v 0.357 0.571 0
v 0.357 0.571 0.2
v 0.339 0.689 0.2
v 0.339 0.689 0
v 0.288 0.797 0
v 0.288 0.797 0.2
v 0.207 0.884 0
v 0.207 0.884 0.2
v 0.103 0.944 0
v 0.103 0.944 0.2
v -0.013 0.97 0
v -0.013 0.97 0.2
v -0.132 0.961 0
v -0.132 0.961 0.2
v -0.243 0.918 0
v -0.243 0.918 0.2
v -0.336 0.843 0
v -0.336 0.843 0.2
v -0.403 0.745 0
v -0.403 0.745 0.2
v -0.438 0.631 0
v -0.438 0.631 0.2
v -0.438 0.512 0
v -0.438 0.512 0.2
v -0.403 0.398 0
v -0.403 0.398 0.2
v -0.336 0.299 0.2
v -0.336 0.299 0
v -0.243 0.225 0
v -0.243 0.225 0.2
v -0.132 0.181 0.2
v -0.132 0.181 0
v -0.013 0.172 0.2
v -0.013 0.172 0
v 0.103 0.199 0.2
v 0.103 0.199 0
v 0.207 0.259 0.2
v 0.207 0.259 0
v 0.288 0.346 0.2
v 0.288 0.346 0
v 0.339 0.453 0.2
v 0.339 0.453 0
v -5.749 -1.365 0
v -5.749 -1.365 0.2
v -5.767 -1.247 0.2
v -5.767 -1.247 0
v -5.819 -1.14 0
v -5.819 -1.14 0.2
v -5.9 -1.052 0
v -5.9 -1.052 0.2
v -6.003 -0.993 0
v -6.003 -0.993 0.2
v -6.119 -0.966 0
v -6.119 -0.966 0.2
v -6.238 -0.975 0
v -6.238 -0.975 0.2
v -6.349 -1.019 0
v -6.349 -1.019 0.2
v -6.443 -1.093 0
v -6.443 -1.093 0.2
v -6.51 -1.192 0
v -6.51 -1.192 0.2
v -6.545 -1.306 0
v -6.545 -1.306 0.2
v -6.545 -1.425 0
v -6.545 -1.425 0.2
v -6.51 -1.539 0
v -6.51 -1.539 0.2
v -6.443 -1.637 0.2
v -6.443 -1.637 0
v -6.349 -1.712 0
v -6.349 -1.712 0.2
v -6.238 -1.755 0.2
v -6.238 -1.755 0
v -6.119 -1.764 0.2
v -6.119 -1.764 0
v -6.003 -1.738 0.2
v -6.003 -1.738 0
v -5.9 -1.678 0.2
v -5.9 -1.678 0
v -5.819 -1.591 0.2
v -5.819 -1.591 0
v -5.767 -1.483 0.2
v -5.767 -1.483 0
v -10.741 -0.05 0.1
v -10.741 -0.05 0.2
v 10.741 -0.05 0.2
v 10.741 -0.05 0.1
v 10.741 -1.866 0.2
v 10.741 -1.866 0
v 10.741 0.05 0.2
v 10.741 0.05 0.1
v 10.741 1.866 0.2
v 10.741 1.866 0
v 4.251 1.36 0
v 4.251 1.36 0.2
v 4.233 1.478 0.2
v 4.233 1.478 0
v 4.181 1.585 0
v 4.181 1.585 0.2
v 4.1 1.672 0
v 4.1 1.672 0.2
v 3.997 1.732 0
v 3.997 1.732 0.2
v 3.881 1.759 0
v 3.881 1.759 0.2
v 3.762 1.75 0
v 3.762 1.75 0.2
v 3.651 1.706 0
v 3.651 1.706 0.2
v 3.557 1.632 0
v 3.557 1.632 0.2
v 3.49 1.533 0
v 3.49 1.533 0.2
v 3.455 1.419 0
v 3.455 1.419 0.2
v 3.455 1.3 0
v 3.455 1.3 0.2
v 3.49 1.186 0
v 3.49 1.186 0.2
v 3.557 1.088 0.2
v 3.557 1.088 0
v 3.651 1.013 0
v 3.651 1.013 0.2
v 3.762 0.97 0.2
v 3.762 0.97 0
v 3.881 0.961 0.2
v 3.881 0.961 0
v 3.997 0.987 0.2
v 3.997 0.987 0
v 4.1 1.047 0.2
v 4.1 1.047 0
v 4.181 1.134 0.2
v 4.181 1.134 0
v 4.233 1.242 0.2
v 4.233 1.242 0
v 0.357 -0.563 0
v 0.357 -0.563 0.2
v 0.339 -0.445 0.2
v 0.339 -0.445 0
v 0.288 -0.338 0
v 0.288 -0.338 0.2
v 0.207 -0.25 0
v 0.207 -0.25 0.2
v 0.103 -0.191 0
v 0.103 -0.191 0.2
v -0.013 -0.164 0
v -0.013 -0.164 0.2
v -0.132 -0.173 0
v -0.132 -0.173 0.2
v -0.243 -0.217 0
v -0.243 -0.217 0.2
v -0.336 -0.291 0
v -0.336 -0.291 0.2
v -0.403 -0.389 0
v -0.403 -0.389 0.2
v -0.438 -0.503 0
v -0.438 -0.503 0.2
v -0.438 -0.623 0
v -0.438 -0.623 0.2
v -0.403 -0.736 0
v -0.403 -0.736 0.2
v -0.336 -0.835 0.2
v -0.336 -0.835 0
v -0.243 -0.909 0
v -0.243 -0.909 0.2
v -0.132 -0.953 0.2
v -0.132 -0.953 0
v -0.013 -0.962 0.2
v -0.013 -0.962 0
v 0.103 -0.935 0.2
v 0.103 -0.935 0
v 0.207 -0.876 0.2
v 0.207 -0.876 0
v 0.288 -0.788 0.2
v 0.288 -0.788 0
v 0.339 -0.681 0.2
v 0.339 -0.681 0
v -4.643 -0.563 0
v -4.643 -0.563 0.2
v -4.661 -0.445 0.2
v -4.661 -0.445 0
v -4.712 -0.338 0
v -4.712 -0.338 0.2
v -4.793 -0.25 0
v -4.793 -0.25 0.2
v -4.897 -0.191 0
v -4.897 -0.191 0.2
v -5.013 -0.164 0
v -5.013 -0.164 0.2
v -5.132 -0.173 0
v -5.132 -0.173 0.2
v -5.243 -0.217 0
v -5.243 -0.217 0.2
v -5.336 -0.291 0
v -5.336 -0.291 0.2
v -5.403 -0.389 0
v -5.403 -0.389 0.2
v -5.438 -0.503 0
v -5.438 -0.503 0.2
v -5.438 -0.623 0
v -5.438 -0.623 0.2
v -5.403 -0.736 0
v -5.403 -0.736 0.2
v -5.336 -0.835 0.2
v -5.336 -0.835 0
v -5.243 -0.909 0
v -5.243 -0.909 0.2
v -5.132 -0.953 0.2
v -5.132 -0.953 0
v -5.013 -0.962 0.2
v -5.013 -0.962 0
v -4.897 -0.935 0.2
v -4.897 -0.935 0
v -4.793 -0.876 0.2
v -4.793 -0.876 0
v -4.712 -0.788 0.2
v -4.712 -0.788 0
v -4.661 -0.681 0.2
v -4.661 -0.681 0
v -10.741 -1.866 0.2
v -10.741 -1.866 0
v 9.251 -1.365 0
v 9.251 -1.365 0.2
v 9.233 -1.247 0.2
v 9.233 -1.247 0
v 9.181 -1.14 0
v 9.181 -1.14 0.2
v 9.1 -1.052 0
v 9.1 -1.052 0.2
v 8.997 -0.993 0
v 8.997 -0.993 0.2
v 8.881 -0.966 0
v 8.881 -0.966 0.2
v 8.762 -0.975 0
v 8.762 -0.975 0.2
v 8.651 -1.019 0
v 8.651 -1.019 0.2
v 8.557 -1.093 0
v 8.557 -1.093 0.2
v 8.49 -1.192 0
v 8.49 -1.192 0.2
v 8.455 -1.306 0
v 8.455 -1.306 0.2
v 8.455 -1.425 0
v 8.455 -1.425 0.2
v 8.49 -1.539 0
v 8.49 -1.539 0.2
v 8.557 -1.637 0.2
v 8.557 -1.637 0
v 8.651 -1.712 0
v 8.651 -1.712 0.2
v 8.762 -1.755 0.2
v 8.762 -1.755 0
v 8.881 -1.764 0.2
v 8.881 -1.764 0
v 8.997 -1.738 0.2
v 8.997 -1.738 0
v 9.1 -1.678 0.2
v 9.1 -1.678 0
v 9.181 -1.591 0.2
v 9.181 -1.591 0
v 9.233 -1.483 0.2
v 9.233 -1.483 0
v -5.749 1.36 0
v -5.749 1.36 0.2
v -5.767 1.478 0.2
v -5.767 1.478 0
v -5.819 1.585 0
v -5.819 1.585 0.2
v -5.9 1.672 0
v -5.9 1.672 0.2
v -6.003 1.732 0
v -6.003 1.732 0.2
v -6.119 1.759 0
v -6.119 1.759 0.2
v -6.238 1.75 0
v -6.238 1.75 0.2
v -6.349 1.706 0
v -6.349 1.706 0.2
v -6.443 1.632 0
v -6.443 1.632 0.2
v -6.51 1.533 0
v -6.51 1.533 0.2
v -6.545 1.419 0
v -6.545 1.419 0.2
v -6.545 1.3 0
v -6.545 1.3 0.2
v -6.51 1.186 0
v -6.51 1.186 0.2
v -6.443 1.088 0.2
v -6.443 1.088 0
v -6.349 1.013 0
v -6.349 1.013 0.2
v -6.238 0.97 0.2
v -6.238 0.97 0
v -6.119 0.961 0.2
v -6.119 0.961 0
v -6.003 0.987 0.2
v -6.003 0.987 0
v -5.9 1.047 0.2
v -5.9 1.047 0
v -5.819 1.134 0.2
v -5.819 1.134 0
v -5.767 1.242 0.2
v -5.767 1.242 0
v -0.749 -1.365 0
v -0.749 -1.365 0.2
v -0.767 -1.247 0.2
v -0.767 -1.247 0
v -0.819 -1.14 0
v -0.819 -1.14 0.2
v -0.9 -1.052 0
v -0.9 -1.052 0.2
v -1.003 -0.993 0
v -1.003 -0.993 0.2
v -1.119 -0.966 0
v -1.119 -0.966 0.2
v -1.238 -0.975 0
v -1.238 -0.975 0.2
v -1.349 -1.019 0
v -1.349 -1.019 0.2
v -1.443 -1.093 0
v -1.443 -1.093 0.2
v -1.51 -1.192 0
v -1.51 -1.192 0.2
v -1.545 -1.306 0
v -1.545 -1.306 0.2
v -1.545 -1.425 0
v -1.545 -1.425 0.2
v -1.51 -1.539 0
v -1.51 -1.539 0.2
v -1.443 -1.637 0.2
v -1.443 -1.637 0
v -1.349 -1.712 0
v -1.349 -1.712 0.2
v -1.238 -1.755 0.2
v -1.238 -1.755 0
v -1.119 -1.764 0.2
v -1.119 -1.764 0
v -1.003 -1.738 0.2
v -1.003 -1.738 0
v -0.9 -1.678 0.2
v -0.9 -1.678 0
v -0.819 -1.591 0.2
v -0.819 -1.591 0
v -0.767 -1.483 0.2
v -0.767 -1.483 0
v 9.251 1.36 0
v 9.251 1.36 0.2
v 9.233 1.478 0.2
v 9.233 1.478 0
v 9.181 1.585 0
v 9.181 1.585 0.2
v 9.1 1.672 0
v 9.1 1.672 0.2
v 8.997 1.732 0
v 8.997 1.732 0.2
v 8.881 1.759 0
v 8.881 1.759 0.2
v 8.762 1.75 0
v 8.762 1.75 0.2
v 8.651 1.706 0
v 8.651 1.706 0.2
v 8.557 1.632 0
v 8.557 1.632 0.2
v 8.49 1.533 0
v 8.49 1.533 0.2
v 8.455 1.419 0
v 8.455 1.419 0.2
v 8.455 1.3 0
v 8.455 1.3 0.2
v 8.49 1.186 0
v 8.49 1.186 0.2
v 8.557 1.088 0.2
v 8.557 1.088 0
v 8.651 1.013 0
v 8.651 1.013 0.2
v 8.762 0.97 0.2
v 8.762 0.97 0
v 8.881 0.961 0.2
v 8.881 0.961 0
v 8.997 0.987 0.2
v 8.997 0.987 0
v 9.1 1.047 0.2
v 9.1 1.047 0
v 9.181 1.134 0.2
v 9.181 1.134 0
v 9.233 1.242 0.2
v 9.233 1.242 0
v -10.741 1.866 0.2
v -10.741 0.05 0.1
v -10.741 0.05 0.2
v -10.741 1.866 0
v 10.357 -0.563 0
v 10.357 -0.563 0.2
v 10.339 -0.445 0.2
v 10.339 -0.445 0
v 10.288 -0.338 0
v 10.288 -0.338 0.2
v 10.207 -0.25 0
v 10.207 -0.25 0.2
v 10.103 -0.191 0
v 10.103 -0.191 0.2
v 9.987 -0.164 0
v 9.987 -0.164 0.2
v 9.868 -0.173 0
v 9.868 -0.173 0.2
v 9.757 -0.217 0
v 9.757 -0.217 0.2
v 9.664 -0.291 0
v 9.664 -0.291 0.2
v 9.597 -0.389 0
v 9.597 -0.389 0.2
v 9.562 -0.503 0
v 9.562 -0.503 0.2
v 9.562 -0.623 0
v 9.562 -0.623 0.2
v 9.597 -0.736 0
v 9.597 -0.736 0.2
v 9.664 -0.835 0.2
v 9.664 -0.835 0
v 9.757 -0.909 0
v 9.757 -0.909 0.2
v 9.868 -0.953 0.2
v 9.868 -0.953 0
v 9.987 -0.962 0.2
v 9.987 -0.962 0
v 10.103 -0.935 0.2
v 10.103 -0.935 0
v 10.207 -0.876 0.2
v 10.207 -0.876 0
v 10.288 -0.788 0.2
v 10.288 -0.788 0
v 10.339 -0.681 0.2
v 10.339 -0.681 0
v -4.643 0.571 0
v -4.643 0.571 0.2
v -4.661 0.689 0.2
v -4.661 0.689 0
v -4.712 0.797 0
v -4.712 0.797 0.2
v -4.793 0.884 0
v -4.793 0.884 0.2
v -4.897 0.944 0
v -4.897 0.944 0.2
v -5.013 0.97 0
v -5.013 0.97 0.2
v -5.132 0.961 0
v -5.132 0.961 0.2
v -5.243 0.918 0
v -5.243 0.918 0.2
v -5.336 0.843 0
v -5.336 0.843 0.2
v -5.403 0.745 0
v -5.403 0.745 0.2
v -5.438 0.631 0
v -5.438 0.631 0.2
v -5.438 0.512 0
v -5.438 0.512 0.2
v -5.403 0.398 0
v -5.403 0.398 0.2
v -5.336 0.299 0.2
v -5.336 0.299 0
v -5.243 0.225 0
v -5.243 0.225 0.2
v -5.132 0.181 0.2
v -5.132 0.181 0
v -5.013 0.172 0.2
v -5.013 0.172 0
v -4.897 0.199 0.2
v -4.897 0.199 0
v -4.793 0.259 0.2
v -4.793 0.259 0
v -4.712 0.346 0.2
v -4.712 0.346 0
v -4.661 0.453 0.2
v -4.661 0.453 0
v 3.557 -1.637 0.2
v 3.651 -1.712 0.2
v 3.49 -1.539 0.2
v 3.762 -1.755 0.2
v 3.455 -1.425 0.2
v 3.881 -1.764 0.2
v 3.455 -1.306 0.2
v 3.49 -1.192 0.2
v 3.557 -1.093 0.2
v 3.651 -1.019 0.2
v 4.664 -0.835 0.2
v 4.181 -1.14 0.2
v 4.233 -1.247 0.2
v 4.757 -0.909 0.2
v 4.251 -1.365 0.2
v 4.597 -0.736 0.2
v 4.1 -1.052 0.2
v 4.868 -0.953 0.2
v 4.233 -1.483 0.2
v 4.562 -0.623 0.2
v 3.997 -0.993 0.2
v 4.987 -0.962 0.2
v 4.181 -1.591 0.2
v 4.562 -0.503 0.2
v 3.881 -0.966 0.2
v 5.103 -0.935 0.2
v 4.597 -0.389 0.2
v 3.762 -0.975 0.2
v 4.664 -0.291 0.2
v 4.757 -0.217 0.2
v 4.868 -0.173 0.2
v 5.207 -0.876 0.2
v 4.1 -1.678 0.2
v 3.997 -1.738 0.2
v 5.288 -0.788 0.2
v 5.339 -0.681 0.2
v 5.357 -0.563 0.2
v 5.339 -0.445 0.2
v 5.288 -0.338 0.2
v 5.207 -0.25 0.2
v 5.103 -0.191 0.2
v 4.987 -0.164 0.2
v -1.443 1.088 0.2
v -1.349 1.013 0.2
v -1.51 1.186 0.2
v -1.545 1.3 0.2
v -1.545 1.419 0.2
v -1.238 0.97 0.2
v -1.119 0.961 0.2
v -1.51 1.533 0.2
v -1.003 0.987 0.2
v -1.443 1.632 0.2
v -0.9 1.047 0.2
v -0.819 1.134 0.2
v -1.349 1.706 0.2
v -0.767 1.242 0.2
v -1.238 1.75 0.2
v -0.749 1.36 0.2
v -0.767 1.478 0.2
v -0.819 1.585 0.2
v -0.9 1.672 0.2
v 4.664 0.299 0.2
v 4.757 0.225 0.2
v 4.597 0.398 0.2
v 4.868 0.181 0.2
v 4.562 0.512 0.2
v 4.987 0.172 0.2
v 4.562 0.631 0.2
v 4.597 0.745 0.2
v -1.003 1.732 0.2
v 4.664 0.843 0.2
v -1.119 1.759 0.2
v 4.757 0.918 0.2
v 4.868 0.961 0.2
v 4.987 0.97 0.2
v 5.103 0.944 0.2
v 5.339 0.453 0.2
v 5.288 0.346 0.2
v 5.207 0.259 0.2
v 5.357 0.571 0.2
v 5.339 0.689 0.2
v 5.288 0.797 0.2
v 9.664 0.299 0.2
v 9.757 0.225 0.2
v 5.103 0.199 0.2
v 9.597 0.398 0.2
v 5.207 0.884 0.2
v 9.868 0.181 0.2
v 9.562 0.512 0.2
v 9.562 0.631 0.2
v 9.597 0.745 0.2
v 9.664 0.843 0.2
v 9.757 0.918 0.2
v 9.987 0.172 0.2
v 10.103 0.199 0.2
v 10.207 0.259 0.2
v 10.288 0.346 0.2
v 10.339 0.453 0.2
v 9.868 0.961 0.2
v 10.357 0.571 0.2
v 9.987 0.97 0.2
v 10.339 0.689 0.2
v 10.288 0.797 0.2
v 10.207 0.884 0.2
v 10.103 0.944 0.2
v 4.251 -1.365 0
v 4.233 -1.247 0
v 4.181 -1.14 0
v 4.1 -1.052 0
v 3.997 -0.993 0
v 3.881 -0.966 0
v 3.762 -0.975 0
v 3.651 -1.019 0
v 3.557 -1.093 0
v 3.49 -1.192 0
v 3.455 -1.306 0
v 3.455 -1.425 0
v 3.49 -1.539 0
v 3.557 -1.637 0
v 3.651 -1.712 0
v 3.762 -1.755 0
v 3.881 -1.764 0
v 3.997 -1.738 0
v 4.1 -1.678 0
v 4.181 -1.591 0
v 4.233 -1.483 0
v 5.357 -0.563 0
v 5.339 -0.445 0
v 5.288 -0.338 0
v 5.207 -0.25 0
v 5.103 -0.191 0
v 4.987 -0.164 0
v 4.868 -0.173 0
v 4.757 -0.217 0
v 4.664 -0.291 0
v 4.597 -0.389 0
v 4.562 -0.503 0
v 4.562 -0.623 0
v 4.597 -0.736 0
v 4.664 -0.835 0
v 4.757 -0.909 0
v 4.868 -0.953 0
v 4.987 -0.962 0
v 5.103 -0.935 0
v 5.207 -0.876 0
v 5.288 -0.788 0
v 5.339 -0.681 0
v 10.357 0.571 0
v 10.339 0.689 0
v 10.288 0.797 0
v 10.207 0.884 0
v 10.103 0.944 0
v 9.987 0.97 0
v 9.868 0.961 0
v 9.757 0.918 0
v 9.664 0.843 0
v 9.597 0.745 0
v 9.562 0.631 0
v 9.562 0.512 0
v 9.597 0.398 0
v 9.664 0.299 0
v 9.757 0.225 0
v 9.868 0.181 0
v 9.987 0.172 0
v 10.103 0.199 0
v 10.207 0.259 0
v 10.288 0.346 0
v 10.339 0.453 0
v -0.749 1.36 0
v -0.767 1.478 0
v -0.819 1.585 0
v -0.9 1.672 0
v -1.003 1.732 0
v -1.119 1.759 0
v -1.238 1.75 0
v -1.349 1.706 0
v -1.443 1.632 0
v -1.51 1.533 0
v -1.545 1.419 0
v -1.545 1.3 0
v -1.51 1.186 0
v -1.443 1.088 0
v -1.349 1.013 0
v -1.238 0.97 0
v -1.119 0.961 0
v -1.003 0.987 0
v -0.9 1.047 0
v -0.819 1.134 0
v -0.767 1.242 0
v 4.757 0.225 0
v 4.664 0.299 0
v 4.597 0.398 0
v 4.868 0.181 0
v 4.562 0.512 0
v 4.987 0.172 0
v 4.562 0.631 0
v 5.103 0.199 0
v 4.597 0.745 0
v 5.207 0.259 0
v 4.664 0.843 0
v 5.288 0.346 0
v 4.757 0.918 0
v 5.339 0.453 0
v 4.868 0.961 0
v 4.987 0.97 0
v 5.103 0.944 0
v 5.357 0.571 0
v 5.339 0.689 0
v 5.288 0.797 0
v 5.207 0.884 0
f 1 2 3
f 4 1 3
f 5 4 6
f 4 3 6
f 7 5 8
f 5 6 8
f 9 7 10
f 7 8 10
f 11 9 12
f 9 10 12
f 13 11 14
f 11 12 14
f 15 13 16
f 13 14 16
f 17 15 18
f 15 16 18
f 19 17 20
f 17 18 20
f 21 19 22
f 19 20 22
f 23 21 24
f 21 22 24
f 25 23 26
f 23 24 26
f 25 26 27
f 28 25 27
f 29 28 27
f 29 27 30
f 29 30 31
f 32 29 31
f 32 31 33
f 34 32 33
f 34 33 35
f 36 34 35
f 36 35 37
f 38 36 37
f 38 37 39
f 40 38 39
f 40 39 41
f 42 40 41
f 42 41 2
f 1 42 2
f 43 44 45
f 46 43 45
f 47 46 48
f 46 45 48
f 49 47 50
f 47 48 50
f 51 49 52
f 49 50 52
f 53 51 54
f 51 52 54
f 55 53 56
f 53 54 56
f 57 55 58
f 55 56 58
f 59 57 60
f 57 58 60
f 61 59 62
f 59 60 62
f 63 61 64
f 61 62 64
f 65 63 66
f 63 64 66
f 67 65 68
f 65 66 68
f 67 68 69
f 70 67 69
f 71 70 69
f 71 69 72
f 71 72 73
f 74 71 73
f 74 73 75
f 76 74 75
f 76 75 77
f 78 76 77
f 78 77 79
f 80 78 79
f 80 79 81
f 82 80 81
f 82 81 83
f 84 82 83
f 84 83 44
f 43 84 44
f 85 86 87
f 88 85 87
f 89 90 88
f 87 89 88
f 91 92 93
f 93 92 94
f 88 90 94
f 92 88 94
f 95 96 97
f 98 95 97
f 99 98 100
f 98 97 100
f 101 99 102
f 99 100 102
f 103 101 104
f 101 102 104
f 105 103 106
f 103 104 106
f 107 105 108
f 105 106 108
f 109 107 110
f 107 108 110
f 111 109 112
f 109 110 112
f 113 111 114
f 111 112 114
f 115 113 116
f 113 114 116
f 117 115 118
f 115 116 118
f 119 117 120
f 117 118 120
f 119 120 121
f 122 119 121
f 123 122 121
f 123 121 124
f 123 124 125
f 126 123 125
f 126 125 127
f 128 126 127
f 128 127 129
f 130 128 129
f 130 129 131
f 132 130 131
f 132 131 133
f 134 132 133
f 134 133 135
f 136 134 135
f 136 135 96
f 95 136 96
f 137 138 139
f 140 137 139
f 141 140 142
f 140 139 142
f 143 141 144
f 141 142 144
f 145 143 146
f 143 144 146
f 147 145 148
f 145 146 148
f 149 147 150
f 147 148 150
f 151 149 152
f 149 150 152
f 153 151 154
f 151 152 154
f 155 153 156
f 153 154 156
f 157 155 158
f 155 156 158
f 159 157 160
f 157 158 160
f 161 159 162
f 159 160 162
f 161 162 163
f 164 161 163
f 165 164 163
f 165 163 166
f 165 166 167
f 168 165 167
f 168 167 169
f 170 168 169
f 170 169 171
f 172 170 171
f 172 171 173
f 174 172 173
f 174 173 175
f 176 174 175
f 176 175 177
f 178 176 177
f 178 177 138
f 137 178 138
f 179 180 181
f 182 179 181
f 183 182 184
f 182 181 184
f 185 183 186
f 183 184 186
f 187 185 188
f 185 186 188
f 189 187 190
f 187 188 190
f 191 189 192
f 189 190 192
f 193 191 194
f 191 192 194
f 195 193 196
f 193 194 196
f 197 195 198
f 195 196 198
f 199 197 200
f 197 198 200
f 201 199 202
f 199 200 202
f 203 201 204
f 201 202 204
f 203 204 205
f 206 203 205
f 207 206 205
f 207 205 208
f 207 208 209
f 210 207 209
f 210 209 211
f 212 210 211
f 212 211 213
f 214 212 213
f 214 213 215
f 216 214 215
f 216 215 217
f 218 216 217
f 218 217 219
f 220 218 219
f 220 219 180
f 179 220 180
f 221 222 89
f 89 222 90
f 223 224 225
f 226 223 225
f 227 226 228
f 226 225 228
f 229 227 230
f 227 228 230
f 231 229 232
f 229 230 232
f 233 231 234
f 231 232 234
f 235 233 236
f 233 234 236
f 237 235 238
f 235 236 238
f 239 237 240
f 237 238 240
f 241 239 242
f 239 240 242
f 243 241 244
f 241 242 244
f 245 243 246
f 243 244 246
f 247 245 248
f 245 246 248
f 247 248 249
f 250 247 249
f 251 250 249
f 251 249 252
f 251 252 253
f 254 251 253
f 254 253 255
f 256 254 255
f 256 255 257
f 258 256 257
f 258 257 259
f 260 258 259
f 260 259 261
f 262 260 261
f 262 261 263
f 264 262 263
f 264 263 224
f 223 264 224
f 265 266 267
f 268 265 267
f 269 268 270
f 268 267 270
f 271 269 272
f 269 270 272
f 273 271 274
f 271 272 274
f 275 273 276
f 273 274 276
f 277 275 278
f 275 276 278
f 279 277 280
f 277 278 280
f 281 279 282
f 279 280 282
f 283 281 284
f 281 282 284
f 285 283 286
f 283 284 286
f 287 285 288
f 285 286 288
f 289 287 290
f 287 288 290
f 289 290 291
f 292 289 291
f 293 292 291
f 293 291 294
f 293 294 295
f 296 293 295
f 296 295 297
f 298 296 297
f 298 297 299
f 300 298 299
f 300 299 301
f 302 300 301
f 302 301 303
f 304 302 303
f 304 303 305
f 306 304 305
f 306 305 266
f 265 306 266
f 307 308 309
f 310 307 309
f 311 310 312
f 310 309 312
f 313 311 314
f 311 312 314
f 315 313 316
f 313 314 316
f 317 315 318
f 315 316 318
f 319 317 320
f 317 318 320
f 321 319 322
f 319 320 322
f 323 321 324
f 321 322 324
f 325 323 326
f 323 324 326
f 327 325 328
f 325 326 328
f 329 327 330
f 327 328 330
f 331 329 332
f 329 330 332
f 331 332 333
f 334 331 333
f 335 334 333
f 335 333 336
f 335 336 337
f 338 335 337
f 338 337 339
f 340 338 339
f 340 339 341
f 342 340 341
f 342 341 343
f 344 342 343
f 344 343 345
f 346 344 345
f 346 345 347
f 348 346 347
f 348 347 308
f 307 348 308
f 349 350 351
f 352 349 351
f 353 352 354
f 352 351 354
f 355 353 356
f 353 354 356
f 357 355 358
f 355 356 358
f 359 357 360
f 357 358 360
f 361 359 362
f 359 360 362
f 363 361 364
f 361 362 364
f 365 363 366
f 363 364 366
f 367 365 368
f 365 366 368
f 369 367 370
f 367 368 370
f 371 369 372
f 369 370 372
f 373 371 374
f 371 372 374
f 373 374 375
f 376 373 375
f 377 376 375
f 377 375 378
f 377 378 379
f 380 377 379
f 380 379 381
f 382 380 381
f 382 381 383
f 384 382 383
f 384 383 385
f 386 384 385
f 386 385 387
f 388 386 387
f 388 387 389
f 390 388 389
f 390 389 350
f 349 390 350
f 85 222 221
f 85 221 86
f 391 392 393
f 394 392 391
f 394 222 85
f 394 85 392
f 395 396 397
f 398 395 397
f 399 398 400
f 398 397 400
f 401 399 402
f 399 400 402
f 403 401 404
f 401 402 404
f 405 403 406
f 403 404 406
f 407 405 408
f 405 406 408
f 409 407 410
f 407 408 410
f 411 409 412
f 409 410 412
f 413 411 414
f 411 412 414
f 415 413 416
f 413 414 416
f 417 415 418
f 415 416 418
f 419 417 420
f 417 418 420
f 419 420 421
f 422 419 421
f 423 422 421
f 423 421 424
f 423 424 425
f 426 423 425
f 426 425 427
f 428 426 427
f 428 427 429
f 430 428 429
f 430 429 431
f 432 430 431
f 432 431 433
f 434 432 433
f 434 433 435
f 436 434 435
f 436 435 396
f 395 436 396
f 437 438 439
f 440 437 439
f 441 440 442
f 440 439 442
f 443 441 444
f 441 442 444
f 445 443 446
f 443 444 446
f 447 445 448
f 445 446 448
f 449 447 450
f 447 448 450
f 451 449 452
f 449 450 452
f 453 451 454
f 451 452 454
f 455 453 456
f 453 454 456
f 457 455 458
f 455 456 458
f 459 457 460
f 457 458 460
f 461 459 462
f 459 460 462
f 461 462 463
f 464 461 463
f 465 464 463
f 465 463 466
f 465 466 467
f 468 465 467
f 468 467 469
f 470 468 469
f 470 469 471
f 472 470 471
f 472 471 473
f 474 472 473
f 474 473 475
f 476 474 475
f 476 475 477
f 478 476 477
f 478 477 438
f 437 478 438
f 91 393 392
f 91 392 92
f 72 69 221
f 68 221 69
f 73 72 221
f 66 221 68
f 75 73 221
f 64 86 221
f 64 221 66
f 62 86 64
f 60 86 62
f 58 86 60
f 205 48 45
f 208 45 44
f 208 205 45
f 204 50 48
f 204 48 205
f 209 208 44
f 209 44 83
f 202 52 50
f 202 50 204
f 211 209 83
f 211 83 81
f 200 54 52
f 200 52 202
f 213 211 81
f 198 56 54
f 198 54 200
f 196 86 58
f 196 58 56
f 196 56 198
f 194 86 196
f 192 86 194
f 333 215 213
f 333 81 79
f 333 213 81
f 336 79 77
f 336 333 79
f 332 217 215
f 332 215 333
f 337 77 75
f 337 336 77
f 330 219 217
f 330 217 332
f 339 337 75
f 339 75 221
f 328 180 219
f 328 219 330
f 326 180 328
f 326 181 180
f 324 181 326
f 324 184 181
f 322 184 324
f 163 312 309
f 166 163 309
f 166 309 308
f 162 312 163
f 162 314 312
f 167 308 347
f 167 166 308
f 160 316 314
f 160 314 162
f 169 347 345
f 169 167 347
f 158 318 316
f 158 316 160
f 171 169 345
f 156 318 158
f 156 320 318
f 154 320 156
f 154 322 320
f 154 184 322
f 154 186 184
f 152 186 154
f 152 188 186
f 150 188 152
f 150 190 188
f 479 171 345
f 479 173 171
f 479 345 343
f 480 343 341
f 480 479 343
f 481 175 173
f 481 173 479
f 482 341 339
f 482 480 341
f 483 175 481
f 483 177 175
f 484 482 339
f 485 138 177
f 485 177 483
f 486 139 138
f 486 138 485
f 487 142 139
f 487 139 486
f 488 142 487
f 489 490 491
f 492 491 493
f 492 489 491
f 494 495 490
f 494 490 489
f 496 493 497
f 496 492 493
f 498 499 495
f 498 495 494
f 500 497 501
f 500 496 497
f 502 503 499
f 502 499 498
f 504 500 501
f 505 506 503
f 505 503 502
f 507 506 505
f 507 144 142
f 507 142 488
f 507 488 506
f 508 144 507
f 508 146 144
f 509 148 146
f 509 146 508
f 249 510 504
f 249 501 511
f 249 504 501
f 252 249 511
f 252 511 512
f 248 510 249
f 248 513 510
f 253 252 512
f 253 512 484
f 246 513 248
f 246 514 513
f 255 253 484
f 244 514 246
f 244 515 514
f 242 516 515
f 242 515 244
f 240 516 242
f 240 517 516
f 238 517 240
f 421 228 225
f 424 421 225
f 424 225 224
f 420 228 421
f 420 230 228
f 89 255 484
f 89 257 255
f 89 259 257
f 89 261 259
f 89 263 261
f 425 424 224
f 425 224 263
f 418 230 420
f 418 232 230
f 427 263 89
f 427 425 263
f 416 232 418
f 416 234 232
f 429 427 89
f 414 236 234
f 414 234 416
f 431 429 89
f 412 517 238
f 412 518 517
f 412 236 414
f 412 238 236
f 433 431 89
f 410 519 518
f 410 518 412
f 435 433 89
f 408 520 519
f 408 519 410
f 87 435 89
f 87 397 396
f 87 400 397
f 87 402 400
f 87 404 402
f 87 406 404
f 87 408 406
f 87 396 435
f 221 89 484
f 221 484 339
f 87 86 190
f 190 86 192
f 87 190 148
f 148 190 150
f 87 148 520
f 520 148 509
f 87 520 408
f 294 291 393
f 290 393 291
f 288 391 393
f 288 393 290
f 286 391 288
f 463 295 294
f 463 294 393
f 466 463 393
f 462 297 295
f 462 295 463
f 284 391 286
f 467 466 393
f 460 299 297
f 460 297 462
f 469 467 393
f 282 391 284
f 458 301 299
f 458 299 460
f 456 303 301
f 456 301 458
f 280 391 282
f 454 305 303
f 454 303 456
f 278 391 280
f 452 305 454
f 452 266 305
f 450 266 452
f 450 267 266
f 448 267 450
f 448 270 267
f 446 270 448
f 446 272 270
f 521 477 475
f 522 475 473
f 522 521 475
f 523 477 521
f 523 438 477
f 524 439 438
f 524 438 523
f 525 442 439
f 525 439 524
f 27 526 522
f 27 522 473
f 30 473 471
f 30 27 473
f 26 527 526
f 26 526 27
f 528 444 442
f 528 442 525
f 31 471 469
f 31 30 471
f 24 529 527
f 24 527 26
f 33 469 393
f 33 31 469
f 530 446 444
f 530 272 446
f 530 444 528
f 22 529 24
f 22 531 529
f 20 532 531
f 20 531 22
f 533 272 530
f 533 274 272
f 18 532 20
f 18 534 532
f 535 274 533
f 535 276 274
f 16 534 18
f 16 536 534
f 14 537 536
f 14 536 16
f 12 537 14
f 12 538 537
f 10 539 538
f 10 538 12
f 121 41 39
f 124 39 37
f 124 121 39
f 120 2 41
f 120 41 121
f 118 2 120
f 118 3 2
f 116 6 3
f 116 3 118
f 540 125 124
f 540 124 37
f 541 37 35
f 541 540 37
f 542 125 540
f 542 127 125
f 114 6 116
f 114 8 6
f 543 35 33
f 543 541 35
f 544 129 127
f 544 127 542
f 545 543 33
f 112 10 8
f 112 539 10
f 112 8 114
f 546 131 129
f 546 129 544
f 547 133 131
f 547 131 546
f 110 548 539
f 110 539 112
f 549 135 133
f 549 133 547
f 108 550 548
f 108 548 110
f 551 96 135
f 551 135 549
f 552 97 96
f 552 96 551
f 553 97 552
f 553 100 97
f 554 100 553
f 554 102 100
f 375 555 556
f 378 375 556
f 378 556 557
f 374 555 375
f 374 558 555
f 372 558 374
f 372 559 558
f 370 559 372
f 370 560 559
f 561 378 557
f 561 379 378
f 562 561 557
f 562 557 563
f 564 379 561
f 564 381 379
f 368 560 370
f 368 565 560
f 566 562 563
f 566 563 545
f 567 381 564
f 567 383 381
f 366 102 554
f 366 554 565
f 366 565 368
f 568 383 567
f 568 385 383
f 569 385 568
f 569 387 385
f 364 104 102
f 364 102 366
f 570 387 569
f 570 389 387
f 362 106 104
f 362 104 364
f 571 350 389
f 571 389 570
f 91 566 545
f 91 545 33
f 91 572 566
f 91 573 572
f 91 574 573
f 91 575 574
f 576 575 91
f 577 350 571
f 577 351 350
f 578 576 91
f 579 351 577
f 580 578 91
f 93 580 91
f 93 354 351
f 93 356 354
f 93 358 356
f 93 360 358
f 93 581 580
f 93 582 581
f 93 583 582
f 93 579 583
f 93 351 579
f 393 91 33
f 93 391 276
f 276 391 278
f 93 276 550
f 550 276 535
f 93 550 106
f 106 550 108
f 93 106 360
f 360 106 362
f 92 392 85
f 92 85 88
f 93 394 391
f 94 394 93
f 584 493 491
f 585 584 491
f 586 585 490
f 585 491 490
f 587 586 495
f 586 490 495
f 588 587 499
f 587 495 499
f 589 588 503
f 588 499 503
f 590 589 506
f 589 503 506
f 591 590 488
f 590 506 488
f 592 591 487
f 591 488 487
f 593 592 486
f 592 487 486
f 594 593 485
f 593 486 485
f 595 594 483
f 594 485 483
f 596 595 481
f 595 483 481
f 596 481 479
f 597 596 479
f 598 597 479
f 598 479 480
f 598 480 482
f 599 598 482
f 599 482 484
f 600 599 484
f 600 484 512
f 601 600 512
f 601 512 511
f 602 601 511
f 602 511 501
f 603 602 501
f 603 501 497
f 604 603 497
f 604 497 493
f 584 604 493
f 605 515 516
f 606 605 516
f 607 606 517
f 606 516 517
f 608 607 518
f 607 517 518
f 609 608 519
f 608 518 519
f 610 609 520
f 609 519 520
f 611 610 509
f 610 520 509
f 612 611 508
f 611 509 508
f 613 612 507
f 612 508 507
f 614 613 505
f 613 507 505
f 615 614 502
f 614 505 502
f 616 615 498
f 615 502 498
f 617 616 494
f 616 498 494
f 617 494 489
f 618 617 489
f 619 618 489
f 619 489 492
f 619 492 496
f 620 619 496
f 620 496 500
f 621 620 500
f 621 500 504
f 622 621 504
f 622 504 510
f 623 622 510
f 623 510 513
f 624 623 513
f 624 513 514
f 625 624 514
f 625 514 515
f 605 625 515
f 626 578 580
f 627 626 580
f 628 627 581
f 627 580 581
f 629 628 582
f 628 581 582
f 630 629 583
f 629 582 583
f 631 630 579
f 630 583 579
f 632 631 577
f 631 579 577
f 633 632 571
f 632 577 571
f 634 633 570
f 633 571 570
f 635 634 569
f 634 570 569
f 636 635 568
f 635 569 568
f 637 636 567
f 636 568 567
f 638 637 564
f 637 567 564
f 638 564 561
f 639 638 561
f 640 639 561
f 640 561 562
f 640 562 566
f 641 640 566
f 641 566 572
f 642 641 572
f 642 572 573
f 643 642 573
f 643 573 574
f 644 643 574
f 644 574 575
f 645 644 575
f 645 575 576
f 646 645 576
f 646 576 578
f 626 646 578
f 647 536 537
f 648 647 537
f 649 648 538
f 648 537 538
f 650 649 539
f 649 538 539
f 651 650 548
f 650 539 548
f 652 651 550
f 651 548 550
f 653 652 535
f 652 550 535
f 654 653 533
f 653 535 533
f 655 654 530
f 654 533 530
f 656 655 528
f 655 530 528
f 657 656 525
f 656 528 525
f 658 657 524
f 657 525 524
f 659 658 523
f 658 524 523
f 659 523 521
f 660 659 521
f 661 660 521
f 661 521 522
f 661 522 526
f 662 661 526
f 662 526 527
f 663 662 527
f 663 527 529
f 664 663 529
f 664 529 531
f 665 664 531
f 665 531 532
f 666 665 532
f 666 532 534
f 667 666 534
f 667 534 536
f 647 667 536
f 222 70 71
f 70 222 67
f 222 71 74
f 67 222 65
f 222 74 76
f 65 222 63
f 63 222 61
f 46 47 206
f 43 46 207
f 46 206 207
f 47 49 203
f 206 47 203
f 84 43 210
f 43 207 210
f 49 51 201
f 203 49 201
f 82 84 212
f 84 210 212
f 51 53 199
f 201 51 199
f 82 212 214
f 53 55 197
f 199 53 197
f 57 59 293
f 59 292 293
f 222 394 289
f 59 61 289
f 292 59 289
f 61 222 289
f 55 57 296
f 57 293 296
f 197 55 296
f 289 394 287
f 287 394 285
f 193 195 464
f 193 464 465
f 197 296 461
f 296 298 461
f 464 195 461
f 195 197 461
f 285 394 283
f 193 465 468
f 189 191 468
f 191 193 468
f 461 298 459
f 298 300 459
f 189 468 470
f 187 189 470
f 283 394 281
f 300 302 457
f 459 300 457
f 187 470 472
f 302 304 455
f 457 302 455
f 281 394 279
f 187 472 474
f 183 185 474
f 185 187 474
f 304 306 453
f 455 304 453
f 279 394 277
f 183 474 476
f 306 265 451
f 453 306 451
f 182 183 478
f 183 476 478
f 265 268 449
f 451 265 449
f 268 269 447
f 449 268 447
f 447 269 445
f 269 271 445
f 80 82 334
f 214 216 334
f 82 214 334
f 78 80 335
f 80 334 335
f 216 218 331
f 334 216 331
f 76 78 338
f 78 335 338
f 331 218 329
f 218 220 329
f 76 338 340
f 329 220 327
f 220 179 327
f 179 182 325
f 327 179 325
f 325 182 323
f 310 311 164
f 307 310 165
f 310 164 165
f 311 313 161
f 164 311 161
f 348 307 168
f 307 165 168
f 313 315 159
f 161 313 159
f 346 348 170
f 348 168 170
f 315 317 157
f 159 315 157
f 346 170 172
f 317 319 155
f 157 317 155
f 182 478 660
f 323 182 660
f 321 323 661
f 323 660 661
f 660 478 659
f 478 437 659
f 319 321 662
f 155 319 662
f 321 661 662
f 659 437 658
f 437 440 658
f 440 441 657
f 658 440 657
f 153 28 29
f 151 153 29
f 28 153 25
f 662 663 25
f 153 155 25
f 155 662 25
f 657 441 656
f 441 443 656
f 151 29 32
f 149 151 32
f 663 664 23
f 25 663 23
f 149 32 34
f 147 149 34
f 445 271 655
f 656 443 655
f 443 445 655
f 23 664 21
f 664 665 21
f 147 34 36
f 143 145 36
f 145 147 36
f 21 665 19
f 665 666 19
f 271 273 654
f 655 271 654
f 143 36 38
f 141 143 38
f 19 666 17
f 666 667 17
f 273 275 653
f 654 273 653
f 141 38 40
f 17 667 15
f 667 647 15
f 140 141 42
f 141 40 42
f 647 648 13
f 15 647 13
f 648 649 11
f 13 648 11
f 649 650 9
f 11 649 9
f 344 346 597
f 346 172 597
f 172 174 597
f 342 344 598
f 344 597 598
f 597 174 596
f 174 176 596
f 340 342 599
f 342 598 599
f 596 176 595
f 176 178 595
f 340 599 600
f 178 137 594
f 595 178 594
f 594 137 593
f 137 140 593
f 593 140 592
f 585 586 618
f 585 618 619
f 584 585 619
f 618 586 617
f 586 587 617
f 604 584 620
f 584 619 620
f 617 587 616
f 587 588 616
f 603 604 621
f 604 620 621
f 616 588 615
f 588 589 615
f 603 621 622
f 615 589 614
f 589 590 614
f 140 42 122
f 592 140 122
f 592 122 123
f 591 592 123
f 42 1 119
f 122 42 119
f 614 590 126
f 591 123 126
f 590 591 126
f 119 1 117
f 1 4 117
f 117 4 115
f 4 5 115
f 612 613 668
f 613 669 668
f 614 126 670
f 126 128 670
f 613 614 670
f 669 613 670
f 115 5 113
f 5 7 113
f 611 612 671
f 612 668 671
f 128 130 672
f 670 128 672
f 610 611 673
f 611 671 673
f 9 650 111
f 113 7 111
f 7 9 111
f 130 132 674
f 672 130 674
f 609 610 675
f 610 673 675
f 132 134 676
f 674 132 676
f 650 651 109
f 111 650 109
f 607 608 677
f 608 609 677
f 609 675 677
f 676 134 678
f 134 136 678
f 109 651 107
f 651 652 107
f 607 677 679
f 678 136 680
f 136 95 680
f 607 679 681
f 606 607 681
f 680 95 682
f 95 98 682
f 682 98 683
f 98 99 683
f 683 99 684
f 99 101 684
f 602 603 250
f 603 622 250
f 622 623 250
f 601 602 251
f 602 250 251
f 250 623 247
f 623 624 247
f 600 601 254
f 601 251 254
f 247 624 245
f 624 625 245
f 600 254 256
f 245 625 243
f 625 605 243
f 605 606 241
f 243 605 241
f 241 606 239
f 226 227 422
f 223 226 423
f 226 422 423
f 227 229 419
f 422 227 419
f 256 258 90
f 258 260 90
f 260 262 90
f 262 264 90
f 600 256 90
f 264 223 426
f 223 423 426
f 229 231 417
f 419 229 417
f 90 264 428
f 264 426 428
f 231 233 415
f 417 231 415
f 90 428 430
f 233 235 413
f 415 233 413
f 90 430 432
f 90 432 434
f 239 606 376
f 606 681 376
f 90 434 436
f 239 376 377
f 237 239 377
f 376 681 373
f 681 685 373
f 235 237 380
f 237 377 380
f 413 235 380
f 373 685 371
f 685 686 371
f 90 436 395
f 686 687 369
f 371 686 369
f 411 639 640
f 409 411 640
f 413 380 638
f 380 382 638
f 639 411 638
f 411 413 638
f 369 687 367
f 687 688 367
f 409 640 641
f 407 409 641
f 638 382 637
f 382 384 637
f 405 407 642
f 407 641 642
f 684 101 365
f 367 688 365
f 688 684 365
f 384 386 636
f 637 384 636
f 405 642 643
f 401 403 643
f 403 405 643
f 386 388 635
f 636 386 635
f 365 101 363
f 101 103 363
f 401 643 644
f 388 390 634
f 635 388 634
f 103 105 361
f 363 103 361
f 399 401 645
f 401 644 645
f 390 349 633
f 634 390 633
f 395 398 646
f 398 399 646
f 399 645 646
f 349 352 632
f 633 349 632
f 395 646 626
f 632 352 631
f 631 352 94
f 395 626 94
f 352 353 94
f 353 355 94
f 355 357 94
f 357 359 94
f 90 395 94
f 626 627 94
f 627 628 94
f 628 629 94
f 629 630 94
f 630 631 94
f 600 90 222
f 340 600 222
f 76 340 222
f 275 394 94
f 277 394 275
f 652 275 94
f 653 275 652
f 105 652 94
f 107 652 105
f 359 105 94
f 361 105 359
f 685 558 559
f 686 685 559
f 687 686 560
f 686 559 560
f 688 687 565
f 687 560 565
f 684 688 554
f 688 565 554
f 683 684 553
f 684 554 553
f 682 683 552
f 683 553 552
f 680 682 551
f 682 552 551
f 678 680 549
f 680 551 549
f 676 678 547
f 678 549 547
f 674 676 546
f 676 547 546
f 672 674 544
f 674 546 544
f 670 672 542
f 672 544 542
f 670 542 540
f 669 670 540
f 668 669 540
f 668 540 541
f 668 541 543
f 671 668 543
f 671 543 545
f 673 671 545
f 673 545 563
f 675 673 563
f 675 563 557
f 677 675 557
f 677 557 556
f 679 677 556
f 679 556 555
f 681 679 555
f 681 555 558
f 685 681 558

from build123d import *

# Parameters (mm, degrees)
SKIZZE1_W                       = 21.482125196
SKIZZE1_H                       = 3.731950896
AUFSATZ_LINEAR_AUSTRAGEN1_DEPTH = 0.2
SKIZZE2_W                       = 21.482125196
SKIZZE2_H                       = 0.1
SCHNITT_LINEAR_AUSTRAGEN1_DEPTH = 0.1
SKIZZE3_R                       = 0.4
SCHNITT_LINEAR_AUSTRAGEN2_DEPTH = 1.2
LINEARES_MUSTER1_COUNT          = 4
LINEARES_MUSTER1_PITCH          = 5


with BuildPart() as part:
    # Skizze1 → Aufsatz-Linear austragen1 (new body)
    with BuildSketch(Plane.XY):
        Rectangle(SKIZZE1_W, SKIZZE1_H)
    extrude(amount=AUFSATZ_LINEAR_AUSTRAGEN1_DEPTH)

    # Skizze2 → Schnitt-Linear austragen1 (cut)
    with BuildSketch(Plane.XY.offset(0.2)):
        Rectangle(SKIZZE2_W, SKIZZE2_H)
    extrude(amount=-SCHNITT_LINEAR_AUSTRAGEN1_DEPTH, mode=Mode.SUBTRACT)

    # Skizze3 → Schnitt-Linear austragen2 (cut, through all)
    with BuildSketch(Plane.XY.offset(0.2)):
        with Locations((9.957181888, -0.562943668)):
            Circle(SKIZZE3_R)
        with Locations((8.850641756, -1.365185264)):
            Circle(SKIZZE3_R)
        with Locations((9.957181888, 0.571259967)):
            Circle(SKIZZE3_R)
        with Locations((8.850641756, 1.359669812)):
            Circle(SKIZZE3_R)
    schnitt_linear_austragen2 = extrude(amount=-SCHNITT_LINEAR_AUSTRAGEN2_DEPTH, mode=Mode.SUBTRACT)

    # Lineares Muster1: Schnitt-Linear austragen2 ×4
    with Locations(*[(-i * LINEARES_MUSTER1_PITCH, 0, 0) for i in range(1, LINEARES_MUSTER1_COUNT)]):
        add(schnitt_linear_austragen2, mode=Mode.SUBTRACT)


solid = part.part
